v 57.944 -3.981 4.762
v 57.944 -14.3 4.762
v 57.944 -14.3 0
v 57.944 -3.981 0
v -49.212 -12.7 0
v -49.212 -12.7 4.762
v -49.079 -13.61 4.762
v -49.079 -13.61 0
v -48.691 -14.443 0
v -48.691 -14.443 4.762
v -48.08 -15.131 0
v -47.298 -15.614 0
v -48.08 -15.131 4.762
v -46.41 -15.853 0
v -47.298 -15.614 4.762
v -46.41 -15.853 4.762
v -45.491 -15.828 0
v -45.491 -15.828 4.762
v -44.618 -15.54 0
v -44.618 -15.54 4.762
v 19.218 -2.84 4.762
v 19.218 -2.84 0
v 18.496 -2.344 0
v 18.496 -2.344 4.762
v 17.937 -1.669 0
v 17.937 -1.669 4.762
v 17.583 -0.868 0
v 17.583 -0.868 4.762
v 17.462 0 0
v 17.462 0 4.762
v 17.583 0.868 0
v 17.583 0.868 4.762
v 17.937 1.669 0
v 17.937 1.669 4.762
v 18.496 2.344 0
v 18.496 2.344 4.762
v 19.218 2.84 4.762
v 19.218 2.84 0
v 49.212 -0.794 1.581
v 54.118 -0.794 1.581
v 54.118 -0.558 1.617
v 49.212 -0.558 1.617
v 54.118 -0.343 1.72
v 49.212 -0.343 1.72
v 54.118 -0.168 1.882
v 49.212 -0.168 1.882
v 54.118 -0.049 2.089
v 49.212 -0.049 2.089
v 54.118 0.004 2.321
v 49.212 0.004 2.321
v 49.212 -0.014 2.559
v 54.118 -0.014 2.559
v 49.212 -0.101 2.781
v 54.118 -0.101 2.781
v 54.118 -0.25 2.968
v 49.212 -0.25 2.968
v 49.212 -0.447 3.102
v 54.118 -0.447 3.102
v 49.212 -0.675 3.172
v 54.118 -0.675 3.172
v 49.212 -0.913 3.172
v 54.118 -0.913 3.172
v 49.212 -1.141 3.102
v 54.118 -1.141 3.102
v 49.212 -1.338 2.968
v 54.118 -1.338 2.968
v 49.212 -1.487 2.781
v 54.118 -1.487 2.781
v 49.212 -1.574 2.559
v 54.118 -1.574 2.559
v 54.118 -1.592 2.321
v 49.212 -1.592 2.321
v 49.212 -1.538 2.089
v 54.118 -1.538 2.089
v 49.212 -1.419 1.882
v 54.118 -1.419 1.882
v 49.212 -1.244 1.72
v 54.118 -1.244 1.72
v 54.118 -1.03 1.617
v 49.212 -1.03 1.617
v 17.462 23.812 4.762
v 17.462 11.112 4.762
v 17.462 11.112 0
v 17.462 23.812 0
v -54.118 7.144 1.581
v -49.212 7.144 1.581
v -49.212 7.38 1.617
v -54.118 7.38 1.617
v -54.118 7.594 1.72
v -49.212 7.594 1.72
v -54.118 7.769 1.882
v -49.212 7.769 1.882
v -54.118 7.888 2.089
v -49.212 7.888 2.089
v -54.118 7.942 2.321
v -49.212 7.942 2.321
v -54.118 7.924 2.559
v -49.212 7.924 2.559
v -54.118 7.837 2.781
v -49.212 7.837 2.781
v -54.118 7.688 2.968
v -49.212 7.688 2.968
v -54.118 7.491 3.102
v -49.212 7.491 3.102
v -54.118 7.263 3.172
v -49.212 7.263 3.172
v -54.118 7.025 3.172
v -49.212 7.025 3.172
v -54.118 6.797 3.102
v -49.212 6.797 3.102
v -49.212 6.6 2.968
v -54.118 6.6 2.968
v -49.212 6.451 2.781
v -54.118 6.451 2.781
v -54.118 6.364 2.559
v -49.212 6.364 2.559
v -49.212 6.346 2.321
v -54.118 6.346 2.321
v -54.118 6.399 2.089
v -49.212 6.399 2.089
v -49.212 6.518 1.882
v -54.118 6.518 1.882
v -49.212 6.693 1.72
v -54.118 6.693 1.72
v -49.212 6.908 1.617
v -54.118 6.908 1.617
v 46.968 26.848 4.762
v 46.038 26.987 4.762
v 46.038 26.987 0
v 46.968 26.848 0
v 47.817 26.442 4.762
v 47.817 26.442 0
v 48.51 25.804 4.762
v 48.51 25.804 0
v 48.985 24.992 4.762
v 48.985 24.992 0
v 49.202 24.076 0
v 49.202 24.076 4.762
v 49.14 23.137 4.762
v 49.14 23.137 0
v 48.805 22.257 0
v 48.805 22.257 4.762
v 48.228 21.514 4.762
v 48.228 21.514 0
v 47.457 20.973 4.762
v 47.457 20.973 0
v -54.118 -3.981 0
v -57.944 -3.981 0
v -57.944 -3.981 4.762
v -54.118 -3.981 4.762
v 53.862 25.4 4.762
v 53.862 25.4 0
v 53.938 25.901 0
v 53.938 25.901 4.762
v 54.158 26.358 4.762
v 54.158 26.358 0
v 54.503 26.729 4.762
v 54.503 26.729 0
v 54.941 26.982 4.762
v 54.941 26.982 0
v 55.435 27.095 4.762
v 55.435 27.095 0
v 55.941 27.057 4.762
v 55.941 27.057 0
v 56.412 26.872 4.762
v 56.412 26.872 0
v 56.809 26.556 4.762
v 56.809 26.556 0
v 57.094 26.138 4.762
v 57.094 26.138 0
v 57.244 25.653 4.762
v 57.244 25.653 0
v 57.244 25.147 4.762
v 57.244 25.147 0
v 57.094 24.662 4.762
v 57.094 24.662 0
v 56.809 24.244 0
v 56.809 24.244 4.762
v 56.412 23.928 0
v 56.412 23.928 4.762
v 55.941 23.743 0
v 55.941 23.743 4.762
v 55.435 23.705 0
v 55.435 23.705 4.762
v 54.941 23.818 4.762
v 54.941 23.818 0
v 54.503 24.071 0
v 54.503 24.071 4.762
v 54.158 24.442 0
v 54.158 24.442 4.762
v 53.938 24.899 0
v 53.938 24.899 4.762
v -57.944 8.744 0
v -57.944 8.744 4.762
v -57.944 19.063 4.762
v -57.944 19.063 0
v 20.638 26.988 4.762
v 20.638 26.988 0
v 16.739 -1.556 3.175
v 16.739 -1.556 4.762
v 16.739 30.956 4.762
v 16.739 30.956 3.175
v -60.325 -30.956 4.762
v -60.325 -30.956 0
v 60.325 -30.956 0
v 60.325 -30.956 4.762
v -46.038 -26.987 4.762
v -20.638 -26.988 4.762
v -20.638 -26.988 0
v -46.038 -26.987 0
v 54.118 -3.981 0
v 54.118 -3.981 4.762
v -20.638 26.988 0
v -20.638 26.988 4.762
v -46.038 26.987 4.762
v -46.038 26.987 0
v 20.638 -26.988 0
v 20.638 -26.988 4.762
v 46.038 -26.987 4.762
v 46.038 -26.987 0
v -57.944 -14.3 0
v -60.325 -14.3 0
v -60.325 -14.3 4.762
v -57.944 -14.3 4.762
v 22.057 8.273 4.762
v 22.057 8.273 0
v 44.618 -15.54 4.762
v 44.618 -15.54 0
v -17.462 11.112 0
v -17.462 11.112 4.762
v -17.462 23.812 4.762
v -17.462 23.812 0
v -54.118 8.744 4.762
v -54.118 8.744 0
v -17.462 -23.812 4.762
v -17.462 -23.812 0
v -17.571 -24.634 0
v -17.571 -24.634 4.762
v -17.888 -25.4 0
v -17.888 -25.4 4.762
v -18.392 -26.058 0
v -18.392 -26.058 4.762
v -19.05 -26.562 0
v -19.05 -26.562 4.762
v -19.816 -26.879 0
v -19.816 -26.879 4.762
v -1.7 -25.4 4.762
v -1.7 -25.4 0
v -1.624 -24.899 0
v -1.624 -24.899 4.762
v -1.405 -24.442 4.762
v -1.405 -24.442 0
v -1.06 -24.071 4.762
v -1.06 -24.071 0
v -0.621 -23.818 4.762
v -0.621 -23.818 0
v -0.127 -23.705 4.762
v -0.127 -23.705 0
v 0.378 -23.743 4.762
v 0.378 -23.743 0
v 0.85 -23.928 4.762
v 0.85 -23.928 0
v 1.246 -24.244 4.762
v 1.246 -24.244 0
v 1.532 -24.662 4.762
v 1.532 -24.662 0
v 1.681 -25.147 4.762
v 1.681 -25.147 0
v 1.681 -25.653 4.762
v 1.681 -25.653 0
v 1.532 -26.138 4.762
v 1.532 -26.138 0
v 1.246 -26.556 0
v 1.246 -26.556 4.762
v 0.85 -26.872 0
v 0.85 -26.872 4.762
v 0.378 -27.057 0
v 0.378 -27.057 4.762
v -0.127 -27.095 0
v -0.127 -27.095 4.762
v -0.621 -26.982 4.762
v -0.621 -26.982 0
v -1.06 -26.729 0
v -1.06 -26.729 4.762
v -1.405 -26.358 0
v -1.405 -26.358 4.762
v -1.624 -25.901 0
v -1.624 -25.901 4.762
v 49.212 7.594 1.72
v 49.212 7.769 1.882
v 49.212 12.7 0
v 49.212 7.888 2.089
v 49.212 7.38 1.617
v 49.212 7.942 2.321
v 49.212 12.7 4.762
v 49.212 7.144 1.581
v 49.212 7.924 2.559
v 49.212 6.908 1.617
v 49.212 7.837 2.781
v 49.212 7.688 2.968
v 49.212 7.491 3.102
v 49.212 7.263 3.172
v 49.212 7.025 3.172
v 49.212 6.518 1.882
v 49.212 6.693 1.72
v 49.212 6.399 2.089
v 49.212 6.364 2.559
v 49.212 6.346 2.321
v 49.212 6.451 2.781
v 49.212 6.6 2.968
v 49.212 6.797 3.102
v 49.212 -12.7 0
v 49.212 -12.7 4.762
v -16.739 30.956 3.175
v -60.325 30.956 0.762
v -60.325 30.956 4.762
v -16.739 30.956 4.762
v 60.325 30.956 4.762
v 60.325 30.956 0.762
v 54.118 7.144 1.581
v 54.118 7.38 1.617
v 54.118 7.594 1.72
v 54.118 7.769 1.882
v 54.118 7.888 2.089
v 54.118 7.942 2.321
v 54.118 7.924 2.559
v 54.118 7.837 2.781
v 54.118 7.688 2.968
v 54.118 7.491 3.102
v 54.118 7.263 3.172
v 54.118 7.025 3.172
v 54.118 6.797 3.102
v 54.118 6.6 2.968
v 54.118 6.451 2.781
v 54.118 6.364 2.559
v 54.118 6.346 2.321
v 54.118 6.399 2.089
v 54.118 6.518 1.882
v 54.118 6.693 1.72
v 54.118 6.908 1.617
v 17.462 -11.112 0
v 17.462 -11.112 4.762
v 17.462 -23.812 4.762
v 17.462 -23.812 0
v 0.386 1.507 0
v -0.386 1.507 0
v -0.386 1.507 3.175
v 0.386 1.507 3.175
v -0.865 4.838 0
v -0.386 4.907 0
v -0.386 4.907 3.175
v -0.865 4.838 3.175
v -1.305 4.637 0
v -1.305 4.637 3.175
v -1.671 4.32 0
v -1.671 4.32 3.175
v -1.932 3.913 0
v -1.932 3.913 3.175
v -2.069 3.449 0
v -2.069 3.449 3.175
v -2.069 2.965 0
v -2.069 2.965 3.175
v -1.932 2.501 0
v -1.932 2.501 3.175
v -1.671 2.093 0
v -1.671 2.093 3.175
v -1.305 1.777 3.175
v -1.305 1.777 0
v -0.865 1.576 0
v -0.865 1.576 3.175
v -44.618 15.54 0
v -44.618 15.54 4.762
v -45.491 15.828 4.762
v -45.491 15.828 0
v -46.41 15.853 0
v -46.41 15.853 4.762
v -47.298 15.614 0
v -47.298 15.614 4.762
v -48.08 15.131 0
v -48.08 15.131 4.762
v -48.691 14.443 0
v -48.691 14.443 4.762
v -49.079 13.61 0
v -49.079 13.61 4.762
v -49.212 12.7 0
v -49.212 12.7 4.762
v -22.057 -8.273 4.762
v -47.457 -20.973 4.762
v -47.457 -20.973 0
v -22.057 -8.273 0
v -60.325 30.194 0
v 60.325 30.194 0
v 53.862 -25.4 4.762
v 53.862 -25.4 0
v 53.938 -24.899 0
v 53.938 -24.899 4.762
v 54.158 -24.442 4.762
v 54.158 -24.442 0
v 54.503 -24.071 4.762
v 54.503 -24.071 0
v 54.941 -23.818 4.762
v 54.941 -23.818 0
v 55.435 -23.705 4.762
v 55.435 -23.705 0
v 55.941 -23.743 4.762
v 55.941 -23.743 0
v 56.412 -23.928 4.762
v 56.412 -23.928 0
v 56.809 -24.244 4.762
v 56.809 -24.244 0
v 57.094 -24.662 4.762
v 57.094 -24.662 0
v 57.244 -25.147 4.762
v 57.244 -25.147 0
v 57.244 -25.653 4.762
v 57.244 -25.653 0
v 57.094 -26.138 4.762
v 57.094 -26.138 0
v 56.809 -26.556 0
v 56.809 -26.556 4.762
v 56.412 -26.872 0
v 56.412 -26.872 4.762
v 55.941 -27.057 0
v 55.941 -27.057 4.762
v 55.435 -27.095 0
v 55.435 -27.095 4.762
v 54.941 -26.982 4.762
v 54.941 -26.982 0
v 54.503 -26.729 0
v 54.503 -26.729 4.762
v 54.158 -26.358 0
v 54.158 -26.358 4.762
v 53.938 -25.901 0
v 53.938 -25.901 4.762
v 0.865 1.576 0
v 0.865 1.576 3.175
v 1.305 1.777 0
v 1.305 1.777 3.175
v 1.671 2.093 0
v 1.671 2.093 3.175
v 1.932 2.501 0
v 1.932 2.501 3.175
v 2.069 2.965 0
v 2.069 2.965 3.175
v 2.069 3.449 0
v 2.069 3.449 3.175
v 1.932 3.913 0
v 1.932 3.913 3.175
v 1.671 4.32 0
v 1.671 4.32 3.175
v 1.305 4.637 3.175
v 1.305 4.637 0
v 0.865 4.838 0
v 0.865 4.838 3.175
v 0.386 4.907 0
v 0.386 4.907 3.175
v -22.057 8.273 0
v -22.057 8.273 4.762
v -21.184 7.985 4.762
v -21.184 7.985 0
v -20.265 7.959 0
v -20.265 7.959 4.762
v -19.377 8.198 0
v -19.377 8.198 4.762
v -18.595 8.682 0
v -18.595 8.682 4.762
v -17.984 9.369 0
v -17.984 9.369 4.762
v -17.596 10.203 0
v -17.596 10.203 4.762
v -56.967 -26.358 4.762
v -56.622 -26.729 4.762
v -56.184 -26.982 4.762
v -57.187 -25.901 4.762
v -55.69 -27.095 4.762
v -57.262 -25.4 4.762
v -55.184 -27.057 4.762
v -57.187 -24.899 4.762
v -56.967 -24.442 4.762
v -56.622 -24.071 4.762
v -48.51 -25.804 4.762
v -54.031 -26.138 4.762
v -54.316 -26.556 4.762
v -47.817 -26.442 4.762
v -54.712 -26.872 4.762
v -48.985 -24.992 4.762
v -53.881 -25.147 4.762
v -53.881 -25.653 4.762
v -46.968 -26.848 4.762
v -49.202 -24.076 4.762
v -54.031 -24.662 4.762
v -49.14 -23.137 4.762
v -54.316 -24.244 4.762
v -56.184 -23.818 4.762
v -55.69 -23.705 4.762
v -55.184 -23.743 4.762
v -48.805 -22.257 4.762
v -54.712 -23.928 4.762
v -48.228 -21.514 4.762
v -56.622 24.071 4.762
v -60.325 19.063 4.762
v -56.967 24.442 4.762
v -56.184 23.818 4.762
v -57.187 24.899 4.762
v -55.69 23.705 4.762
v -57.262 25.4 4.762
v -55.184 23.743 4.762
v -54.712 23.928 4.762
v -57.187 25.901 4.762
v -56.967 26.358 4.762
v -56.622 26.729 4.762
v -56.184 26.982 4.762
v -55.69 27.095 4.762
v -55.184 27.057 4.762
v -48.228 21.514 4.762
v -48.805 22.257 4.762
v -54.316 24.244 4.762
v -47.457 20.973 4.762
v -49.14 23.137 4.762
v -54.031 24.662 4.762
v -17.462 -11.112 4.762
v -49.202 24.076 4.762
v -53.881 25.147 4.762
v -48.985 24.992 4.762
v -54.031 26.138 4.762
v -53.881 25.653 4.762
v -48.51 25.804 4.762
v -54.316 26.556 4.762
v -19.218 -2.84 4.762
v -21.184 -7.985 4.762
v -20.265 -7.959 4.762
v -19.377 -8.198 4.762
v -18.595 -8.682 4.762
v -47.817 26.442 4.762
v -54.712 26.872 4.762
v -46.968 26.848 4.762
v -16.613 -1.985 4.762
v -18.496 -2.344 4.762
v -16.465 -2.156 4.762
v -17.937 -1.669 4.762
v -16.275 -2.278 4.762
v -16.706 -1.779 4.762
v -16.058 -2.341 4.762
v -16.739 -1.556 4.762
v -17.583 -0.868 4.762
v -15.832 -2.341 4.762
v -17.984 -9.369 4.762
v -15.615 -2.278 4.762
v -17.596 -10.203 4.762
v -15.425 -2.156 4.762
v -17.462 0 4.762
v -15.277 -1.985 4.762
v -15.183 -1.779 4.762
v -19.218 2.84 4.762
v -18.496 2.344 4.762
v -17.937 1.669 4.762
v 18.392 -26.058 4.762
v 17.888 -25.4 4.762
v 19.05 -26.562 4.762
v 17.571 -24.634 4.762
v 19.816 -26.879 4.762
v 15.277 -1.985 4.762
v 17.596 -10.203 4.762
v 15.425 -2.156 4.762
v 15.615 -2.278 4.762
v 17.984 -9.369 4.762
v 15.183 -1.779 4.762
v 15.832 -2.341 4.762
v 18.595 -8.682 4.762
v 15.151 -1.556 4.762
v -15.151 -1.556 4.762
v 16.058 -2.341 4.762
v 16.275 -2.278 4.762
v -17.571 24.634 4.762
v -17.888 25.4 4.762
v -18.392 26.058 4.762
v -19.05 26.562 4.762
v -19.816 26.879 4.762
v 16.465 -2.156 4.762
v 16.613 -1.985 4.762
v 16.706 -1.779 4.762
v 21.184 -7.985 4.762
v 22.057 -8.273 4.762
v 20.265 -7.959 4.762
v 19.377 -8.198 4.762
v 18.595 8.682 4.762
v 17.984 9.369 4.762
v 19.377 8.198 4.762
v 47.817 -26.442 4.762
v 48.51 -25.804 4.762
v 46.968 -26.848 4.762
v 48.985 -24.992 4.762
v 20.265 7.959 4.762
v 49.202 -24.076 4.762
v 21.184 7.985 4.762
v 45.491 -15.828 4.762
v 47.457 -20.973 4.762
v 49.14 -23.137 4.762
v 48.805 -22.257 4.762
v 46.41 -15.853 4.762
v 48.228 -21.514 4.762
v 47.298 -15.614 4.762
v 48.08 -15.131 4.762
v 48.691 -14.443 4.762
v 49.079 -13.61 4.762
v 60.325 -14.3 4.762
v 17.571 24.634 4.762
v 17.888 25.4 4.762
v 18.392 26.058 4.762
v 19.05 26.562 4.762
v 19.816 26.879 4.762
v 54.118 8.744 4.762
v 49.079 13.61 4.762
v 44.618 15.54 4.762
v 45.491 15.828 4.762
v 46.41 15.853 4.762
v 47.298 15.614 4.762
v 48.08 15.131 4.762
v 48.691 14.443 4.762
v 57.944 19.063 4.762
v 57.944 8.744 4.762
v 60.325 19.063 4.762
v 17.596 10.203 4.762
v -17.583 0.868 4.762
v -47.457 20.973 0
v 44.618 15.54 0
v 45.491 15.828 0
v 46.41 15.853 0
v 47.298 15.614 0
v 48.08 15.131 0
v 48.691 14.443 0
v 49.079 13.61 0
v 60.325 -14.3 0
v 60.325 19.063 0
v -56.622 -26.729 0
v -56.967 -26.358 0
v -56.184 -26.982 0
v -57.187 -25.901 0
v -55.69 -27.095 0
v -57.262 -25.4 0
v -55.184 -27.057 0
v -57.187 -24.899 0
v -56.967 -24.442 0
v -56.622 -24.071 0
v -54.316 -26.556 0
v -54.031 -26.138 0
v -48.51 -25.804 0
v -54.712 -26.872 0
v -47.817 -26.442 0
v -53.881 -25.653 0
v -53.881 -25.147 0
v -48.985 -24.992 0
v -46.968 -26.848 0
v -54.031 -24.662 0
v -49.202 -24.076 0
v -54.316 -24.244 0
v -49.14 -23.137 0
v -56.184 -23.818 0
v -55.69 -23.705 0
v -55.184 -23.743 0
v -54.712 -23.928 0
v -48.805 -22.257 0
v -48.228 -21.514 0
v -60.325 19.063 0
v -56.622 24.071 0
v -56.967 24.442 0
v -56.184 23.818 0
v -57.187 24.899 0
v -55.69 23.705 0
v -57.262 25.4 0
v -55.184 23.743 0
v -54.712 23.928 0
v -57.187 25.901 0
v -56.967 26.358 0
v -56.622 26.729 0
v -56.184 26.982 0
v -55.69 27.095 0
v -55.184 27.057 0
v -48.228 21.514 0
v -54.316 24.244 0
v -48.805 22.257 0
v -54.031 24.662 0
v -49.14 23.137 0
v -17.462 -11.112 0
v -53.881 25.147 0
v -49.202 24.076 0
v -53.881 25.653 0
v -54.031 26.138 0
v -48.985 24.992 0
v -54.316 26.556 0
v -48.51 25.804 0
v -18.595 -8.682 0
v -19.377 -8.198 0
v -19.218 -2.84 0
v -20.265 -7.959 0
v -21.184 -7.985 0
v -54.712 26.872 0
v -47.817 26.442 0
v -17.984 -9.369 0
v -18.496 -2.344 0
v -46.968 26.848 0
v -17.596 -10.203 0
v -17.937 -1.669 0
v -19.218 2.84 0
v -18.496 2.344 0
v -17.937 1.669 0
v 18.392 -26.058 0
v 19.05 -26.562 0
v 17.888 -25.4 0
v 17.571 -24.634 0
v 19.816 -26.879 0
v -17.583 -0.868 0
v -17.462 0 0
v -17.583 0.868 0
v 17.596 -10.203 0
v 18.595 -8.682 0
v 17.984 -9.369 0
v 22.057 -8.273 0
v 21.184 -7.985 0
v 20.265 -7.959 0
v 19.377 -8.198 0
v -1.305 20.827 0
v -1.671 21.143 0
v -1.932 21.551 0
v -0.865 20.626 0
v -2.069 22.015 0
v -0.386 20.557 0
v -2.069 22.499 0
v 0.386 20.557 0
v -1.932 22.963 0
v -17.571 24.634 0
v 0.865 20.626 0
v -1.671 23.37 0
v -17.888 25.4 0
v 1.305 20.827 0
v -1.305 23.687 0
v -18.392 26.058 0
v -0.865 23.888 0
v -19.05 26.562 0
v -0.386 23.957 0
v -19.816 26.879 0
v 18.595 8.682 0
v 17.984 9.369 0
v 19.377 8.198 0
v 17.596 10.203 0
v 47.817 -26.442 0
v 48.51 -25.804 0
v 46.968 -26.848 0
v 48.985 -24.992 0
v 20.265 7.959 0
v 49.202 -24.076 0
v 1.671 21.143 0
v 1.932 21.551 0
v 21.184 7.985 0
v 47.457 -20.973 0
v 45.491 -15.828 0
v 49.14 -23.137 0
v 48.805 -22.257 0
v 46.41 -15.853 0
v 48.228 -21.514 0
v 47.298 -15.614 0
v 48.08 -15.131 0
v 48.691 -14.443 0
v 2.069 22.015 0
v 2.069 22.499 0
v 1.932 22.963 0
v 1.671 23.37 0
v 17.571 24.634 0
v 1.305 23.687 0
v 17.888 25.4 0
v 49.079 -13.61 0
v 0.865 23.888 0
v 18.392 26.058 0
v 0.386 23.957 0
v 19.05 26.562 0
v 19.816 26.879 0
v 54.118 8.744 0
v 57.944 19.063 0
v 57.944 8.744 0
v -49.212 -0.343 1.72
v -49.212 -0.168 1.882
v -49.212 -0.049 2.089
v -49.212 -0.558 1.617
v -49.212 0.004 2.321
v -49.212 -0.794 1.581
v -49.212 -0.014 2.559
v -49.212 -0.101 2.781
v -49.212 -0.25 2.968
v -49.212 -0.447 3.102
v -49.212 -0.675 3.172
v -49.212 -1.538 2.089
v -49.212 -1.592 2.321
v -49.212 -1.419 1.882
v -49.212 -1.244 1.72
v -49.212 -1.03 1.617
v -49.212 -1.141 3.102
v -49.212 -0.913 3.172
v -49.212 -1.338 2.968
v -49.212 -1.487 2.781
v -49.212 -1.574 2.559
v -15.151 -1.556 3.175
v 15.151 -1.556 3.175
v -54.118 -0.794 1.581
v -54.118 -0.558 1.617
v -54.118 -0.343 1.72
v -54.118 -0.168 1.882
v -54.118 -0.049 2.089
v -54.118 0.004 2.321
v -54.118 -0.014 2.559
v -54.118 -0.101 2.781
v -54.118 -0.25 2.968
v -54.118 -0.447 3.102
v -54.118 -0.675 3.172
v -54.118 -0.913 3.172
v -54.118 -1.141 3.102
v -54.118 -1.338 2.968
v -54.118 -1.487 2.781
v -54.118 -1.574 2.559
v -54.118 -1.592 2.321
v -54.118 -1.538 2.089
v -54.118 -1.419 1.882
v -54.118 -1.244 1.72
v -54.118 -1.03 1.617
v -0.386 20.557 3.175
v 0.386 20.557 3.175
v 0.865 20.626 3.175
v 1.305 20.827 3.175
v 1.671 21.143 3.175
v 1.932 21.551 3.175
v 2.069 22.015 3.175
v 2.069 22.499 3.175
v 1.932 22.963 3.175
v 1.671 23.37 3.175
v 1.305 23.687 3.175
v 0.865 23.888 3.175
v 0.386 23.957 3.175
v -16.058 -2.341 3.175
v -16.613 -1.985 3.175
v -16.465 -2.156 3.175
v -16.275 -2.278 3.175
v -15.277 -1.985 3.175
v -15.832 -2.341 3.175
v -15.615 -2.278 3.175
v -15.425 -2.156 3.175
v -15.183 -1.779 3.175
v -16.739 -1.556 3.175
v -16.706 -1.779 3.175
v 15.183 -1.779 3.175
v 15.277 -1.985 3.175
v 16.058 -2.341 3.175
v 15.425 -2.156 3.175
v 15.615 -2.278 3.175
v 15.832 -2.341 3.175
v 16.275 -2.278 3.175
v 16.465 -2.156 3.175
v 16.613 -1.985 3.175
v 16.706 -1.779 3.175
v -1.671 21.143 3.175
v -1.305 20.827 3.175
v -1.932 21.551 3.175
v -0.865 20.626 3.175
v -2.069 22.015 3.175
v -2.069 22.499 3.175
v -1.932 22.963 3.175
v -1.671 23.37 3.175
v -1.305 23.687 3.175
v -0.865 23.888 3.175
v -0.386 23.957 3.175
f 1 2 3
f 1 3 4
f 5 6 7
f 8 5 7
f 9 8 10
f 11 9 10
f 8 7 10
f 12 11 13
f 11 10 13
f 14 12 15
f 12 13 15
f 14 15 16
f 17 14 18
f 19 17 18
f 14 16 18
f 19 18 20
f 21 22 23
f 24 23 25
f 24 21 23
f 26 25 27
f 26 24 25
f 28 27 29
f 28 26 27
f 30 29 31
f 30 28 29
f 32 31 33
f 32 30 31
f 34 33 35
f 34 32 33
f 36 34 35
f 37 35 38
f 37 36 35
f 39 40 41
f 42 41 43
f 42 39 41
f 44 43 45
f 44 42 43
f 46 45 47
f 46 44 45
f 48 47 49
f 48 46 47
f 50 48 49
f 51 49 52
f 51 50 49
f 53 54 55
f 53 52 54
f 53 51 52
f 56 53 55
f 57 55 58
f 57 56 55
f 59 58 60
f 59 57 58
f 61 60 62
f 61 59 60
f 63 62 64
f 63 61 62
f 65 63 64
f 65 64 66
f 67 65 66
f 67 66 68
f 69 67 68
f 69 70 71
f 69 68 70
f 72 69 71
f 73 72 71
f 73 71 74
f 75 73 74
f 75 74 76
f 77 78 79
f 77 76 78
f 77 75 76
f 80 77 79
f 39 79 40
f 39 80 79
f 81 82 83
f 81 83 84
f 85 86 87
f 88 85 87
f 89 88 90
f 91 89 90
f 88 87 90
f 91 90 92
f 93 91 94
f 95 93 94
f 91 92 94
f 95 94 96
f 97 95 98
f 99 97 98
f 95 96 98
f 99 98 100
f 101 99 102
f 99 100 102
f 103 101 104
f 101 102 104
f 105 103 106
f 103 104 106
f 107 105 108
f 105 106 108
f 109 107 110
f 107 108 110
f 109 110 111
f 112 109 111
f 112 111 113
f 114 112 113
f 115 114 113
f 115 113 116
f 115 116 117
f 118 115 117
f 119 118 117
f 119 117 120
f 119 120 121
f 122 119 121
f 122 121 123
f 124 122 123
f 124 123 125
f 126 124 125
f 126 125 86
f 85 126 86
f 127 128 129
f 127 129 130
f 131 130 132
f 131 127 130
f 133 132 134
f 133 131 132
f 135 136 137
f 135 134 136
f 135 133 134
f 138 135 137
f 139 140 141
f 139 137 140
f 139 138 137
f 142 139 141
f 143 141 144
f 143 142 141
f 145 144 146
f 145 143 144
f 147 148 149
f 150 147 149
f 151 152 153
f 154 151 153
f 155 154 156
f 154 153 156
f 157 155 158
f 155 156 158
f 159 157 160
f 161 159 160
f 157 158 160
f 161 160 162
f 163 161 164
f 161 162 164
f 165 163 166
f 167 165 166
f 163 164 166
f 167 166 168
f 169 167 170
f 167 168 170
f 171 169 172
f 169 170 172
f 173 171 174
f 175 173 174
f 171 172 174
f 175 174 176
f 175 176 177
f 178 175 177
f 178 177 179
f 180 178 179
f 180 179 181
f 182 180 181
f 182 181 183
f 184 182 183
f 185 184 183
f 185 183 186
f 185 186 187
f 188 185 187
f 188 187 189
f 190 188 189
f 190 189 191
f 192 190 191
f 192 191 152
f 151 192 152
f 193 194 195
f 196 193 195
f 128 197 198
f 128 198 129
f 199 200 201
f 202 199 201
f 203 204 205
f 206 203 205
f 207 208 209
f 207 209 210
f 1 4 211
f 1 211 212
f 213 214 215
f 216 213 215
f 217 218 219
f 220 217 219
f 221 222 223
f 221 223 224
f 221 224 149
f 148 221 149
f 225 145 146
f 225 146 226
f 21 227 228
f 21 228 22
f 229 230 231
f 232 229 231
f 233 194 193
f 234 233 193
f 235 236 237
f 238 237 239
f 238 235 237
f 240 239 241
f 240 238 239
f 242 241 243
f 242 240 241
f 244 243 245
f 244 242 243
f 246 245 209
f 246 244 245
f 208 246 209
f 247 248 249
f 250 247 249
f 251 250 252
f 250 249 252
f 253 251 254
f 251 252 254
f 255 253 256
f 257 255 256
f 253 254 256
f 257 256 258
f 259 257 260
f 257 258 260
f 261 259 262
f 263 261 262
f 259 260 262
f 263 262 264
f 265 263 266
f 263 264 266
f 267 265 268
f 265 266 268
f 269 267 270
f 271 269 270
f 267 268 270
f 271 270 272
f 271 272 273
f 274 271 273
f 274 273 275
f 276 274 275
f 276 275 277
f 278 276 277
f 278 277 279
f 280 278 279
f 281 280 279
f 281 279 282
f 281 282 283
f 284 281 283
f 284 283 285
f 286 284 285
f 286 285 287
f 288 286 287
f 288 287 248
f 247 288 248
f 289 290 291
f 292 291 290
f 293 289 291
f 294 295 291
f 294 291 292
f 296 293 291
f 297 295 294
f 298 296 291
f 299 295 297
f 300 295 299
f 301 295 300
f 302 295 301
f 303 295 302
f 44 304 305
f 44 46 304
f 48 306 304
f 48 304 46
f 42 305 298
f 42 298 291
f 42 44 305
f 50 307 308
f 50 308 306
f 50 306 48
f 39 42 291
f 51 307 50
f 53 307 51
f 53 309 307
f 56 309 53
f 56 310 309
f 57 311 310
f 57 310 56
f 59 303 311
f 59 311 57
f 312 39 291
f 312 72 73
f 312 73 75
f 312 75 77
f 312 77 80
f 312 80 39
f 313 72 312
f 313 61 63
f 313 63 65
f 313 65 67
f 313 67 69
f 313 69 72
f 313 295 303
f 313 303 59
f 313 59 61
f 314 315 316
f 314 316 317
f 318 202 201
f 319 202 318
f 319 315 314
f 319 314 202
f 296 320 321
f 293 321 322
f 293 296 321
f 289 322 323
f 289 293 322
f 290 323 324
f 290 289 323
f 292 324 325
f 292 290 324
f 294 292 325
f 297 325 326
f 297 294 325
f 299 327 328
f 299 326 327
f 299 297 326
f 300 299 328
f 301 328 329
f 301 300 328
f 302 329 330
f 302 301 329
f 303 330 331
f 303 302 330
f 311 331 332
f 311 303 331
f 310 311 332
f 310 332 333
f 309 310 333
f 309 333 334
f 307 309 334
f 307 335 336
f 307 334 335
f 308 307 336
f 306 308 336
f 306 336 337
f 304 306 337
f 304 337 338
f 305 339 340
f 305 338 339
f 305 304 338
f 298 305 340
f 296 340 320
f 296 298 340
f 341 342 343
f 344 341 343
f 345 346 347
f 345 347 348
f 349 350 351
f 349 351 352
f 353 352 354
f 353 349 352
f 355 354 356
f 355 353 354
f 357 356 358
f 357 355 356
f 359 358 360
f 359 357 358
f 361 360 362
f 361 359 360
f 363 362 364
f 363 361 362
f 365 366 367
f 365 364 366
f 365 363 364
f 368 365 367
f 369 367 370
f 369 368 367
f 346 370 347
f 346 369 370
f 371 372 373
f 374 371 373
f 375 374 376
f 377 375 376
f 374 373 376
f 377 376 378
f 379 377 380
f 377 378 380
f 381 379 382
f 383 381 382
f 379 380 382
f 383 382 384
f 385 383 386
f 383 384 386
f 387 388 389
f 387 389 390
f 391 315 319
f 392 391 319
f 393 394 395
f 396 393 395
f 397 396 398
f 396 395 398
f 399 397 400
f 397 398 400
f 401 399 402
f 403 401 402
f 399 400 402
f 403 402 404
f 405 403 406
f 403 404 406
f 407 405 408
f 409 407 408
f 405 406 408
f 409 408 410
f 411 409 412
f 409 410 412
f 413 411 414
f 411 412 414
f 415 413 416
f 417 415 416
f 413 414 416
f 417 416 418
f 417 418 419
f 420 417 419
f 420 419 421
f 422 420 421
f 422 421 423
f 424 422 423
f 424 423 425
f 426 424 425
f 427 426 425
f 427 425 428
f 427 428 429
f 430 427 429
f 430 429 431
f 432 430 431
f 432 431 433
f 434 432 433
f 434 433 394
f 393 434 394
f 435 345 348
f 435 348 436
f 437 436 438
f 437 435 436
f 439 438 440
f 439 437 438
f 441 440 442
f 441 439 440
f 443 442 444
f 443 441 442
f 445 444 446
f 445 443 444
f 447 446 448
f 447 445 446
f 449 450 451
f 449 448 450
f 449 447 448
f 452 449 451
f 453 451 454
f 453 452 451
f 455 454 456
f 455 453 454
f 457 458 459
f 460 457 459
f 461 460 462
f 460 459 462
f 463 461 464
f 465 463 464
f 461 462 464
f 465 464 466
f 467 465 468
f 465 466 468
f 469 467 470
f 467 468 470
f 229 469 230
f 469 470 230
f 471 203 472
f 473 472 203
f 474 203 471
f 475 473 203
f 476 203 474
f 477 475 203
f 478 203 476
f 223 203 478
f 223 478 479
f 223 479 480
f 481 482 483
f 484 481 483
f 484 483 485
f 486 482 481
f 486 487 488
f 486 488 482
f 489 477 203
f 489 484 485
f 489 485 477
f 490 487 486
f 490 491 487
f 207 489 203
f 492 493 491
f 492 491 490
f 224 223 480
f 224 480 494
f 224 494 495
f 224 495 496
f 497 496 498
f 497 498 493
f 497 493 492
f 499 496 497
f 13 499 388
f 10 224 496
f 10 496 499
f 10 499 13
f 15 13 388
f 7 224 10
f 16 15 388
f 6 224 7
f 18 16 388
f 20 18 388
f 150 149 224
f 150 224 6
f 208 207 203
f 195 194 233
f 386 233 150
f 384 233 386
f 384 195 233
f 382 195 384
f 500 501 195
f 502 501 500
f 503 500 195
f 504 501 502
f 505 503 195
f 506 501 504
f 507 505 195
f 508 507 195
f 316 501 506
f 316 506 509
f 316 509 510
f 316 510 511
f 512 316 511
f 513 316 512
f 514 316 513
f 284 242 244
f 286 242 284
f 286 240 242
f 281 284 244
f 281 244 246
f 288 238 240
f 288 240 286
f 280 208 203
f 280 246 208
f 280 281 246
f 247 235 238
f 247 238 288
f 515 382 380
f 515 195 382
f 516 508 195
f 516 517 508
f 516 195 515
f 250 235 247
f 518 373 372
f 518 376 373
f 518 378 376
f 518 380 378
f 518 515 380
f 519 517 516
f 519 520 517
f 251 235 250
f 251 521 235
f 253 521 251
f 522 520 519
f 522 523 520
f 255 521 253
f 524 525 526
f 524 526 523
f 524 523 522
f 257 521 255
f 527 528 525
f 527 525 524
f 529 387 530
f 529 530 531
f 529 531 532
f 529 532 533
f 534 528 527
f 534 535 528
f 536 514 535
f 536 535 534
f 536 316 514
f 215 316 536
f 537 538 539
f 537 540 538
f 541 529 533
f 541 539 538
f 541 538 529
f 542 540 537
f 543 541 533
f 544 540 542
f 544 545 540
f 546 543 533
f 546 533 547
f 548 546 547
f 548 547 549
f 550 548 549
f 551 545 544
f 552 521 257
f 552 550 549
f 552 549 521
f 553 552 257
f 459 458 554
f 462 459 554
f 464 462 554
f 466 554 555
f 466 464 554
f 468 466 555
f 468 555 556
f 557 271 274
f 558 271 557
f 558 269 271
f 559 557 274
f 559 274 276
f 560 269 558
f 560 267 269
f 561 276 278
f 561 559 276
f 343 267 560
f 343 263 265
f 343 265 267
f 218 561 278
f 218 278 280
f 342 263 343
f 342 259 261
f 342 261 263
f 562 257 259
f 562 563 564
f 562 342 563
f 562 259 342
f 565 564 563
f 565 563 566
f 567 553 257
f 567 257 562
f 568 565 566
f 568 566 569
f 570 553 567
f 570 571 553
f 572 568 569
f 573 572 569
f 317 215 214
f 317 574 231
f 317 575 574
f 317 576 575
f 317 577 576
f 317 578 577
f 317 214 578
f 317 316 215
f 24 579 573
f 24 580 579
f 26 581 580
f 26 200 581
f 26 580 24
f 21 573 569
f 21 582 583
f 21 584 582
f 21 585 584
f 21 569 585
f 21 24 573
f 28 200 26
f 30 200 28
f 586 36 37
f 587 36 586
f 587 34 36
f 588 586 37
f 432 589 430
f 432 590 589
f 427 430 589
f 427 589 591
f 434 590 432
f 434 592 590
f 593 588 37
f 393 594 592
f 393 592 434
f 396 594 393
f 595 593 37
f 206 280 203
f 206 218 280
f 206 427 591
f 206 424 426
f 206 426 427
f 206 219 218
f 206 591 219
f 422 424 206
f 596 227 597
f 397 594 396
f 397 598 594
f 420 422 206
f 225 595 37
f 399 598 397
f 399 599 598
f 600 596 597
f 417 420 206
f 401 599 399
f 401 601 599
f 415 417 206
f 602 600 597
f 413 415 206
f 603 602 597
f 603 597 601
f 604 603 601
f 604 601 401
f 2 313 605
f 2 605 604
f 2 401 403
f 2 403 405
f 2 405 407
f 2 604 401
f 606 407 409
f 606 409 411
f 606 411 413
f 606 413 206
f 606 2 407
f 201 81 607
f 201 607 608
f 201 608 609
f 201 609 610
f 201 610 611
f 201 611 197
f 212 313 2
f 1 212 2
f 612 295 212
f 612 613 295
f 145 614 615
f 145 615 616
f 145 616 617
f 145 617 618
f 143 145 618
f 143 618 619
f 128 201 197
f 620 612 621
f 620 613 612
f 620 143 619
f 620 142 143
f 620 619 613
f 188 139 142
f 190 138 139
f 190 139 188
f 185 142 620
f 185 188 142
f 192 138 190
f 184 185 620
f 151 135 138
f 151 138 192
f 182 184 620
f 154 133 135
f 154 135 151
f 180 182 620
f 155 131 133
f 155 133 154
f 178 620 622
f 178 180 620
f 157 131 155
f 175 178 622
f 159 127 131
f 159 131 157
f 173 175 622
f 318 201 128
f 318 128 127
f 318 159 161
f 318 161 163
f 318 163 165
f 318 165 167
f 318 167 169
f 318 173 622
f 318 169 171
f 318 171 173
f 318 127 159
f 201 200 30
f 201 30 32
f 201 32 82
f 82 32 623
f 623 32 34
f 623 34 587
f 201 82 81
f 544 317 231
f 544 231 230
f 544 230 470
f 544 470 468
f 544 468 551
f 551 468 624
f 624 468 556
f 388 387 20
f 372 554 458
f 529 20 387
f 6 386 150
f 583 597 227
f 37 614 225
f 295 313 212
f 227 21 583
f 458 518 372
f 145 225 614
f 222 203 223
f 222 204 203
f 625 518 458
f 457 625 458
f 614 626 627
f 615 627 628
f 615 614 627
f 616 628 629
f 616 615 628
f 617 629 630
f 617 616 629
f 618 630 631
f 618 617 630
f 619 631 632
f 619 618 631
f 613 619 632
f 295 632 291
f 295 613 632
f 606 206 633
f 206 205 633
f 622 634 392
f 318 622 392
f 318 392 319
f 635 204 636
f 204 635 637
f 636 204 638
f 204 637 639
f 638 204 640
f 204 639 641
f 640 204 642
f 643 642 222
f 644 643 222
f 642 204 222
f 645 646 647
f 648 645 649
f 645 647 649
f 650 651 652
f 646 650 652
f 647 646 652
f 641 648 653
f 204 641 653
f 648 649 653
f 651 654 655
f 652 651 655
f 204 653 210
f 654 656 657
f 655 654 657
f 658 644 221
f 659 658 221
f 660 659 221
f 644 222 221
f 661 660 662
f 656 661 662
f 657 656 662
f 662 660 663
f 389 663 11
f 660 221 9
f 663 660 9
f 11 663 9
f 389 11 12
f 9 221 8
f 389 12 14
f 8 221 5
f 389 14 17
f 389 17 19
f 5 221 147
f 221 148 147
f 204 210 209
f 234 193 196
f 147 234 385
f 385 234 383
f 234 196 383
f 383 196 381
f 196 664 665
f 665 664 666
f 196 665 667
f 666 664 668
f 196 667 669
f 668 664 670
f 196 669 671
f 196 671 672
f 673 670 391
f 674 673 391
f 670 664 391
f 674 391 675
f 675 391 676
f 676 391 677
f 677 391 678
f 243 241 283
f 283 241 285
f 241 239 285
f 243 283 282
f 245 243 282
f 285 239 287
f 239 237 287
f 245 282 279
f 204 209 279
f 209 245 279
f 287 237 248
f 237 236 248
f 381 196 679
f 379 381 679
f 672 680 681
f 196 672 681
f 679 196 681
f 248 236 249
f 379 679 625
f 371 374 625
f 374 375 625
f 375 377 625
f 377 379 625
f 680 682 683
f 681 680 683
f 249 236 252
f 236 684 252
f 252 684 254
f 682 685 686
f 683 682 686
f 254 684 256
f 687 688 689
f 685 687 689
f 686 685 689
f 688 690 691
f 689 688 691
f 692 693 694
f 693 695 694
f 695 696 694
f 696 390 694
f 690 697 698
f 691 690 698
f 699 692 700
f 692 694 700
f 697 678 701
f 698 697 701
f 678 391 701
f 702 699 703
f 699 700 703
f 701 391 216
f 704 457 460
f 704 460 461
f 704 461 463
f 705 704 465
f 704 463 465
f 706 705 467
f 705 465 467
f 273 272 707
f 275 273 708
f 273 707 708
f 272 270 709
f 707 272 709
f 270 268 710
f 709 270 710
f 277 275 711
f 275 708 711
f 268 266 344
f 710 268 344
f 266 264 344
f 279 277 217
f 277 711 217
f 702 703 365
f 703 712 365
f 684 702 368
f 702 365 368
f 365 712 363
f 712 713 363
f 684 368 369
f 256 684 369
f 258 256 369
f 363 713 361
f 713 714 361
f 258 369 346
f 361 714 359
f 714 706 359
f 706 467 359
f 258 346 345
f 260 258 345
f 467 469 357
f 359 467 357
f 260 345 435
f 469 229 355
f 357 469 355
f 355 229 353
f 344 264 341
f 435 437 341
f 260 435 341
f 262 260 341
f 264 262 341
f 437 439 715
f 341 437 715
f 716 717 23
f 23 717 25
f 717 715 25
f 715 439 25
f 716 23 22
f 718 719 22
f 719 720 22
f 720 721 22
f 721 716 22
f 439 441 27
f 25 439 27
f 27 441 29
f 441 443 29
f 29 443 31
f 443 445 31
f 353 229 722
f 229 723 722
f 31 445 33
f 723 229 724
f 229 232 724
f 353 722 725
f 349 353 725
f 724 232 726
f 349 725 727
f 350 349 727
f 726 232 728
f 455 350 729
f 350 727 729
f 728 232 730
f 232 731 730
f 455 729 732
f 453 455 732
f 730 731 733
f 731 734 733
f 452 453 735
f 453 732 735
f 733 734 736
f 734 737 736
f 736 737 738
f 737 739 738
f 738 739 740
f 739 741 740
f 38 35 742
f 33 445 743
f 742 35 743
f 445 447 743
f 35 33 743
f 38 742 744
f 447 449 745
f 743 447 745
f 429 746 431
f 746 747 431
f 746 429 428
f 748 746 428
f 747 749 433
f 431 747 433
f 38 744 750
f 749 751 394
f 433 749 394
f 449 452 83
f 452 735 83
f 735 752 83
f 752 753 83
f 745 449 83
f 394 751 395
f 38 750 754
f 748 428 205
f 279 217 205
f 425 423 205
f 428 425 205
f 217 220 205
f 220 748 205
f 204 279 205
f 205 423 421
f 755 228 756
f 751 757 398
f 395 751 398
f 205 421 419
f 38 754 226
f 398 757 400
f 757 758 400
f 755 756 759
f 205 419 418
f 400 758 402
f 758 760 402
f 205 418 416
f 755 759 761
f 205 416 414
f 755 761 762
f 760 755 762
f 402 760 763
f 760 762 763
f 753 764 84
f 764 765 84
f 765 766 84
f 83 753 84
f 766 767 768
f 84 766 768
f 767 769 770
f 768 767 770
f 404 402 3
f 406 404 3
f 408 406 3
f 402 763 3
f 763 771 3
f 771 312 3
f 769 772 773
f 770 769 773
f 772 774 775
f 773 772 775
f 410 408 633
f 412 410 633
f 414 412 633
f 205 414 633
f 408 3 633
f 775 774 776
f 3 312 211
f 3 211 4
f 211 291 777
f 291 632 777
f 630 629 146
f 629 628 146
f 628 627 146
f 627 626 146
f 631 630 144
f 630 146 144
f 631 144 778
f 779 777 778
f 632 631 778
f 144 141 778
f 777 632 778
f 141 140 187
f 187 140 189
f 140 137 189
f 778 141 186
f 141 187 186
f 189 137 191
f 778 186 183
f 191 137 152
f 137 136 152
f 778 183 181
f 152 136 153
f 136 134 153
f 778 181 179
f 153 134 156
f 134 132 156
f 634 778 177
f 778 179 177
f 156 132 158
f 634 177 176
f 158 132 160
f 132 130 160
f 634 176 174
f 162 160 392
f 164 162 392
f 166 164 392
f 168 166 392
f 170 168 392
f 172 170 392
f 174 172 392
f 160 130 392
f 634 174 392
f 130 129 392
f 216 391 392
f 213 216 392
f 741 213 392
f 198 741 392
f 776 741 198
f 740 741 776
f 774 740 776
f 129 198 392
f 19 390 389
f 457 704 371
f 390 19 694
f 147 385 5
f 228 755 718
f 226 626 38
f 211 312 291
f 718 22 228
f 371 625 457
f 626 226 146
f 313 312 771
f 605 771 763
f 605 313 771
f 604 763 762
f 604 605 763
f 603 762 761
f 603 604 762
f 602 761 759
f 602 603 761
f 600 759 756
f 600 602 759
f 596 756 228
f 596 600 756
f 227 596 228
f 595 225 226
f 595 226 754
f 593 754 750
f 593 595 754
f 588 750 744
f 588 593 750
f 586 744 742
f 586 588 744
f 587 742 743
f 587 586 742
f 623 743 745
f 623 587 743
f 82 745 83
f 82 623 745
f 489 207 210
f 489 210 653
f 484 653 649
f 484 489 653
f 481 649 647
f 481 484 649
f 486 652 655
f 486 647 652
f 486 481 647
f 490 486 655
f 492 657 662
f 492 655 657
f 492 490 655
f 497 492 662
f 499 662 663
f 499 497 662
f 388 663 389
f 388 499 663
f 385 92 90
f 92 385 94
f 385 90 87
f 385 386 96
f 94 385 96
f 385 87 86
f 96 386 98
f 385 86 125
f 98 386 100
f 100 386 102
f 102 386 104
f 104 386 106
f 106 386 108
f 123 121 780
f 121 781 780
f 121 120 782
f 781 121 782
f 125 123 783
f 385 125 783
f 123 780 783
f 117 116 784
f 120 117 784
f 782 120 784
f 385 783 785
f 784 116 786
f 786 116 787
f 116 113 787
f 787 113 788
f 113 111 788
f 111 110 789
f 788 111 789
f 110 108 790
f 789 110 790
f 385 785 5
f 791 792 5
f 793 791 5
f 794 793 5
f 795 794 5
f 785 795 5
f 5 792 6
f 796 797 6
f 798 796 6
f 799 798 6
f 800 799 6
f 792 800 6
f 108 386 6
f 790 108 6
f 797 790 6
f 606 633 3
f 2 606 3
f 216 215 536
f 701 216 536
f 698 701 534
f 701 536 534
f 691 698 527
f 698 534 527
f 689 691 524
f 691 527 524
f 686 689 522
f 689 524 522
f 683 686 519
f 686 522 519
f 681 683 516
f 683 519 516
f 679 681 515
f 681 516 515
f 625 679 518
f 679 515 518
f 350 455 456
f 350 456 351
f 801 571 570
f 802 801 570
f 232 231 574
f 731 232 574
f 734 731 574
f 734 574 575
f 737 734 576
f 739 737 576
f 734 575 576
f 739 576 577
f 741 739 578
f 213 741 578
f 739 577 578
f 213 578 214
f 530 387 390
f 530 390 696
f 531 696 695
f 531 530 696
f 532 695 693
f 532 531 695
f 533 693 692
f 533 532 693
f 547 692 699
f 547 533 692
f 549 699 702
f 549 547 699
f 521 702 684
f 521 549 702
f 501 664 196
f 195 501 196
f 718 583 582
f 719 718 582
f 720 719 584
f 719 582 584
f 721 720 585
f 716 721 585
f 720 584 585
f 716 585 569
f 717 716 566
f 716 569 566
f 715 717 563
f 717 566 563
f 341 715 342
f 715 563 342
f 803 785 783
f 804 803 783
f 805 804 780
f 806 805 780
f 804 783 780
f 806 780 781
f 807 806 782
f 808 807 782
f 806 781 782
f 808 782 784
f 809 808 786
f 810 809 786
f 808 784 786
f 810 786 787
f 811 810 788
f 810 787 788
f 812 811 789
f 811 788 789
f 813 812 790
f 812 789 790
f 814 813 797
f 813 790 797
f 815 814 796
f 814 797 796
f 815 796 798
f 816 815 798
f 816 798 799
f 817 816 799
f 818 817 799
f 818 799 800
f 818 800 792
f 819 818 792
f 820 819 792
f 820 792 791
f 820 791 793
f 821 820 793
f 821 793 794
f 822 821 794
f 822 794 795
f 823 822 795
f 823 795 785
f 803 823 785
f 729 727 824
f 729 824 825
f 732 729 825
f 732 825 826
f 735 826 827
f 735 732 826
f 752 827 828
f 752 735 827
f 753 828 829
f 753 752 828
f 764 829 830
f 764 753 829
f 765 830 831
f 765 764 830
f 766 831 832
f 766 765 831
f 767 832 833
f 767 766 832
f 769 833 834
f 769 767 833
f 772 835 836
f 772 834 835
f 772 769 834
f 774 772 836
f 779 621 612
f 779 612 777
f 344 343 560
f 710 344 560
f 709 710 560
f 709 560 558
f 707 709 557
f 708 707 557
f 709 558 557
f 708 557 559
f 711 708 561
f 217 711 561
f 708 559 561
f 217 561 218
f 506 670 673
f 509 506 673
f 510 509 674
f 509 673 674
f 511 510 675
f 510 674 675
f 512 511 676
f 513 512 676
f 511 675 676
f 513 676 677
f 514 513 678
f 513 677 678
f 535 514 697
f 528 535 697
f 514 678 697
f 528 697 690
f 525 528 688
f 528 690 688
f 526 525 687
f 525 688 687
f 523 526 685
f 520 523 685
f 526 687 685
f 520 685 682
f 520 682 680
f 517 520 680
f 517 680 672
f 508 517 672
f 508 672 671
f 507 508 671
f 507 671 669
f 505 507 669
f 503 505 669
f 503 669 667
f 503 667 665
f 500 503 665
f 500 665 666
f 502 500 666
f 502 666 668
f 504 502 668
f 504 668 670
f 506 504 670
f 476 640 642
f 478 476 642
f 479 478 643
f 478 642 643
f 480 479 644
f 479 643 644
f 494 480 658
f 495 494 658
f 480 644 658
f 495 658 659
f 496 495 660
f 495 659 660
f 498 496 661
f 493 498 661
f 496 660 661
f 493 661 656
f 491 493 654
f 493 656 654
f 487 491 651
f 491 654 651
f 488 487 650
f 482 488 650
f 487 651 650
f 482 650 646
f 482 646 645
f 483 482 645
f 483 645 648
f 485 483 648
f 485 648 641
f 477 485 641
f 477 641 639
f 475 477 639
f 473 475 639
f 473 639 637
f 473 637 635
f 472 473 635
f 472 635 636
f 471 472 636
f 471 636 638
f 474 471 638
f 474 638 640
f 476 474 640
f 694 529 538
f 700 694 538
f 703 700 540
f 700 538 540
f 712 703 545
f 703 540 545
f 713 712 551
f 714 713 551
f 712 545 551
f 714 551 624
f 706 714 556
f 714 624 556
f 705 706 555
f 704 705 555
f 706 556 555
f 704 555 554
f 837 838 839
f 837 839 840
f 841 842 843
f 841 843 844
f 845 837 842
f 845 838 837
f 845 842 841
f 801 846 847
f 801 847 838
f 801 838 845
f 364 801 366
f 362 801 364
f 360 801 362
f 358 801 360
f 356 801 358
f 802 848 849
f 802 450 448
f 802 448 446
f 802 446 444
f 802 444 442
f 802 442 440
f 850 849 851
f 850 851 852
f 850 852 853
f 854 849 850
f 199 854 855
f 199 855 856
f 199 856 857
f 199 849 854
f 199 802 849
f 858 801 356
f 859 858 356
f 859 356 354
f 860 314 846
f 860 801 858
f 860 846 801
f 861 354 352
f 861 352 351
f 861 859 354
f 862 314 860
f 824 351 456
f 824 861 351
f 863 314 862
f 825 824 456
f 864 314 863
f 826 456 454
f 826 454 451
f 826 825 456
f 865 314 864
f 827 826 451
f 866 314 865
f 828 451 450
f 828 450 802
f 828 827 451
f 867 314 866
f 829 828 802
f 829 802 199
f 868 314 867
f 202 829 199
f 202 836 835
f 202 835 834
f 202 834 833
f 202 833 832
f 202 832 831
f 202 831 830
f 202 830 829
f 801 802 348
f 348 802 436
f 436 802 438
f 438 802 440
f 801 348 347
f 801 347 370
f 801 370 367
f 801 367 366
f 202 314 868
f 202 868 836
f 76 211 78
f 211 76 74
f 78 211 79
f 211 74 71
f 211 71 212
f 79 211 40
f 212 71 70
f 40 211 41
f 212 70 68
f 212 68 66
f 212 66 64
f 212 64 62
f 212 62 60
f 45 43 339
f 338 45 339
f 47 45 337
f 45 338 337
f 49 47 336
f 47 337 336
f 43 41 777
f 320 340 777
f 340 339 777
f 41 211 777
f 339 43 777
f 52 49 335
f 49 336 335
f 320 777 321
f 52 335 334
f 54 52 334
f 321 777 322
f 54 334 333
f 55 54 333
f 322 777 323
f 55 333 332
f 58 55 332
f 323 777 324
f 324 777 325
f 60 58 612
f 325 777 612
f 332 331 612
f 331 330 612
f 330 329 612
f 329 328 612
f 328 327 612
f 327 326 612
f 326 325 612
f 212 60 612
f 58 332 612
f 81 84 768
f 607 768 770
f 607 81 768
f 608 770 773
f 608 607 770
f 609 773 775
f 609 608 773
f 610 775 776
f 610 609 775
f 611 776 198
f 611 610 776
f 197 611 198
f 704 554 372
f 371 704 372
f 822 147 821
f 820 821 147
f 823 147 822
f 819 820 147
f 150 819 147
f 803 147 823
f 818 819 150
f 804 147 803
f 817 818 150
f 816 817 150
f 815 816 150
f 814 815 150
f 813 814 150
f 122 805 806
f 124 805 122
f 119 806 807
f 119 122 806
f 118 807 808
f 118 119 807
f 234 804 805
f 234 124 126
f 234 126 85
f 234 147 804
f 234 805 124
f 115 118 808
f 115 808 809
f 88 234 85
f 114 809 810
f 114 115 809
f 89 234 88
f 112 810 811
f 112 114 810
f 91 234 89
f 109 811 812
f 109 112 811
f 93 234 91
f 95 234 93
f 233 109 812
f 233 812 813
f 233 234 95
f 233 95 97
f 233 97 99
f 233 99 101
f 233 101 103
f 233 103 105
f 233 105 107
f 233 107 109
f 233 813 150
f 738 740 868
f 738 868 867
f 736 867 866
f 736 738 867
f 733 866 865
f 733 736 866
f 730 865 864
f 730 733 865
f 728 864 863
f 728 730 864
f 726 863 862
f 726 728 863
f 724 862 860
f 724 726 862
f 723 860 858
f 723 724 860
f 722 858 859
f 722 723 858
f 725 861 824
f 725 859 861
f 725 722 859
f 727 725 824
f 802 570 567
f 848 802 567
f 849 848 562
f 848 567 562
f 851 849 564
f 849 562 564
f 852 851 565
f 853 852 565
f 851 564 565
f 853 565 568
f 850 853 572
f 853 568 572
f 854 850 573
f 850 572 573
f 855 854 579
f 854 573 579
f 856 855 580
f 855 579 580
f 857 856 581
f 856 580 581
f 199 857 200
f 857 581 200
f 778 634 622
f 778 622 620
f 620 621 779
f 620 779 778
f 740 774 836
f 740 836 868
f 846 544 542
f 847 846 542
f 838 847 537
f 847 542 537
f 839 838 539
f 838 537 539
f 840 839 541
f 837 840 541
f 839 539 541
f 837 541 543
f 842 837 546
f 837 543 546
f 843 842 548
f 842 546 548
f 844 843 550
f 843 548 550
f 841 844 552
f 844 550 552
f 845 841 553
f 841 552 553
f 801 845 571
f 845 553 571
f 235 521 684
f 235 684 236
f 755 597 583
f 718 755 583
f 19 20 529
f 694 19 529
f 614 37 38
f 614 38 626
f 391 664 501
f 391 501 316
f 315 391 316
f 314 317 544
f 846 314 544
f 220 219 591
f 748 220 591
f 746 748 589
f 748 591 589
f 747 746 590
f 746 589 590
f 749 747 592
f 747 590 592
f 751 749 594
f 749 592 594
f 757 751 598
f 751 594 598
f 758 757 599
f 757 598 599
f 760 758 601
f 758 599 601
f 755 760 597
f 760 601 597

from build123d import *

# Parameters (mm, degrees)
SKETCH1_W                 = 120.65
SKETCH1_H                 = 61.9125
BOSS_EXTRUDE1_DEPTH       = 4.7625
SKETCH2_W                 = 4.7625
SKETCH2_H                 = 12.7254
BOSS_EXTRUDE2_DEPTH       = 22.225
CUT_EXTRUDE1_REACH        = 129.448
SKETCH3_R                 = 2.25
FILLET1_R                 = 6.35
FILLET1_OF_MIRROR2_R      = 6.35
M3_CLEARANCE_SLOT1_DEPTH  = 4.7625
SKETCH7_W                 = 2.38125
SKETCH7_H                 = 10.31875
CUT_EXTRUDE3_DEPTH        = 72.353666087
CUT_EXTRUDE4_DEPTH        = 6.207125
CUT_EXTRUDE5_DEPTH        = 72.353666087
CUT_EXTRUDE6_DEPTH        = 72.353666087
M2X0_4_TAPPED_HOLE1_D     = 1.6
M2X0_4_TAPPED_HOLE1_DEPTH = 4.905375
CUT_EXTRUDE7_DEPTH        = 1.5875
M3_CLEARANCE_HOLE2_D      = 3.4
CHAMFER1_SIZE             = 0.762


# Read off the part's stored shape, not the designer's step: M3 Clearance Slot1
with BuildPart() as part:
    # Sketch1 → Boss-Extrude1 (new body)
    with BuildSketch(Plane.XY):
        Rectangle(SKETCH1_W, SKETCH1_H)
    extrude(amount=BOSS_EXTRUDE1_DEPTH)

    # Sketch2 → Boss-Extrude2 (add)
    with BuildSketch(Plane.XY.offset(4.7625)):
        with Locations((-57.94375, 2.38125)):
            Rectangle(SKETCH2_W, SKETCH2_H)
    boss_extrude2 = extrude(amount=BOSS_EXTRUDE2_DEPTH)

    # Sketch3 → Cut-Extrude1 (cut, up to next)
    with BuildSketch(Plane.ZY.offset(60.325), mode=Mode.PRIVATE) as cut_extrude1_sk1:
        with Locations((19.05, 2.36855)):
            Circle(SKETCH3_R)
    cut_extrude1_tool1 = extrude(cut_extrude1_sk1.sketch, amount=-CUT_EXTRUDE1_REACH, mode=Mode.PRIVATE) & part.part
    cut_extrude1 = cut_extrude1_tool1.solids().sort_by_distance((-60.325, 2.36855, 19.05))[0]
    add(cut_extrude1, mode=Mode.SUBTRACT)

    # Fillet1
    fillet1_edges = [part.edges().sort_by_distance(p)[0] for p in [
        (-57.94375, -3.98145, 26.9875),
        (-57.94375, 8.74395, 26.9875),
    ]]
    fillet(fillet1_edges, radius=FILLET1_R)

    # Mirror2: Boss-Extrude2, Cut-Extrude1 across plane
    add(boss_extrude2.mirror(Plane(origin=(0, 0, 0), x_dir=(0, 0, 1), z_dir=(1, 0, 0))))
    add(cut_extrude1.mirror(Plane(origin=(0, 0, 0), x_dir=(0, 0, 1), z_dir=(1, 0, 0))), mode=Mode.SUBTRACT)

    # Fillet1 of Mirror2
    fillet1_of_mirror2_edges = [part.edges().sort_by_distance(p)[0] for p in [
        (57.94375, -3.98145, 26.9875),
        (57.94375, 8.74395, 26.9875),
    ]]
    fillet(fillet1_of_mirror2_edges, radius=FILLET1_OF_MIRROR2_R)

    # M3 Clearance Slot1 outline → M3 Clearance Slot1 (cut)
    with BuildSketch(Plane.XY):
        with BuildLine():
            ThreePointArc((0.386099968, 1.50675), (2.086099968, 3.20675), (0.386099968, 4.90675))
            Line((0.386099968, 4.90675), (-0.386099968, 4.90675))
            ThreePointArc((-0.386099968, 4.90675), (-2.086099968, 3.20675), (-0.386099968, 1.50675))
            Line((-0.386099968, 1.50675), (0.386099968, 1.50675))
        make_face()
        with BuildLine():
            ThreePointArc((0.386099968, 20.55675), (2.086099968, 22.25675), (0.386099968, 23.95675))
            Line((0.386099968, 23.95675), (-0.386099968, 23.95675))
            ThreePointArc((-0.386099968, 23.95675), (-2.086099968, 22.25675), (-0.386099968, 20.55675))
            Line((-0.386099968, 20.55675), (0.386099968, 20.55675))
        make_face()
    extrude(amount=M3_CLEARANCE_SLOT1_DEPTH, mode=Mode.SUBTRACT)

    # Sketch7 → Cut-Extrude3 (cut, through all)
    with BuildSketch(Plane.XY.offset(4.7625)):
        with Locations((-59.134375, 13.903325)):
            Rectangle(SKETCH7_W, SKETCH7_H)
        with Locations((-59.134375, -9.140825)):
            Rectangle(SKETCH7_W, SKETCH7_H)
    cut_extrude3 = extrude(amount=-CUT_EXTRUDE3_DEPTH, mode=Mode.SUBTRACT)

    # Sketch8 → Cut-Extrude4 (cut)
    with BuildSketch(Plane.ZY.offset(60.325)):
        with BuildLine():
            Line((0, 8.74395), (0, -3.98145))
            Line((0, -3.98145), (20.6375, -3.98145))
            ThreePointArc((20.6375, -3.98145), (25.127628061, -2.121578061), (26.9875, 2.36855))
            Line((26.9875, 2.36855), (26.9875, 2.39395))
            ThreePointArc((26.9875, 2.39395), (25.127628061, 6.884078061), (20.6375, 8.74395))
            Line((20.6375, 8.74395), (0, 8.74395))
        make_face()
    cut_extrude4 = extrude(amount=-CUT_EXTRUDE4_DEPTH, mode=Mode.SUBTRACT)

    # Sketch11 → Cut-Extrude5 (cut, through all)
    with BuildSketch(Plane.XY.offset(4.7625)):
        with BuildLine():
            Line((-19.217596834, 2.839806331), (-44.617596834, 15.539806331))
            ThreePointArc((-44.617596834, 15.539806331), (-47.706696281, 15.400816317), (-49.2125, 12.7))
            Line((-49.2125, 12.7), (-49.2125, -12.7))
            ThreePointArc((-49.2125, -12.7), (-47.706696281, -15.400816317), (-44.617596834, -15.539806331))
            Line((-44.617596834, -15.539806331), (-19.217596834, -2.839806331))
            ThreePointArc((-19.217596834, -2.839806331), (-17.4625, 0), (-19.217596834, 2.839806331))
        make_face()
    cut_extrude5 = extrude(amount=-CUT_EXTRUDE5_DEPTH, mode=Mode.SUBTRACT)

    # Sketch12 → Cut-Extrude6 (cut, through all)
    with BuildSketch(Plane.XY.offset(4.7625)):
        with BuildLine():
            Line((-47.457403166, 20.972693669), (-22.057403166, 8.272693669))
            ThreePointArc((-22.057403166, 8.272693669), (-18.968303719, 8.411683683), (-17.4625, 11.1125))
            Line((-17.4625, 11.1125), (-17.4625, 23.8125))
            ThreePointArc((-17.4625, 23.8125), (-18.39243597, 26.05756403), (-20.6375, 26.9875))
            Line((-20.6375, 26.9875), (-46.0375, 26.9875))
            ThreePointArc((-46.0375, 26.9875), (-49.127565542, 24.541965523), (-47.457403166, 20.972693669))
        make_face()
        with BuildLine():
            Line((-20.6375, -26.9875), (-46.0375, -26.9875))
            ThreePointArc((-46.0375, -26.9875), (-49.127565542, -24.541965523), (-47.457403166, -20.972693669))
            Line((-47.457403166, -20.972693669), (-22.057403166, -8.272693669))
            ThreePointArc((-22.057403166, -8.272693669), (-18.968303719, -8.411683683), (-17.4625, -11.1125))
            Line((-17.4625, -11.1125), (-17.4625, -23.8125))
            ThreePointArc((-17.4625, -23.8125), (-18.39243597, -26.05756403), (-20.6375, -26.9875))
        make_face()
    cut_extrude6 = extrude(amount=-CUT_EXTRUDE6_DEPTH, mode=Mode.SUBTRACT)

    # M2x0.4 Tapped Hole1
    with Locations(Plane.ZY.offset(54.117875)):
        with Locations((2.38125, 7.14375), (2.38125, -0.79375)):
            m2x0_4_tapped_hole1 = Hole(M2X0_4_TAPPED_HOLE1_D / 2, depth=M2X0_4_TAPPED_HOLE1_DEPTH)

    # Mirror4: Cut-Extrude5, Cut-Extrude6 across plane
    add(cut_extrude5.mirror(Plane(origin=(0, 0, 0), x_dir=(0, 0, 1), z_dir=(1, 0, 0))), mode=Mode.SUBTRACT)
    add(cut_extrude6.mirror(Plane(origin=(0, 0, 0), x_dir=(0, 0, 1), z_dir=(1, 0, 0))), mode=Mode.SUBTRACT)

    # Mirror3: Cut-Extrude3, Cut-Extrude4, M2x0.4 Tapped Hole1 across plane
    add(cut_extrude3.mirror(Plane(origin=(0, 0, 0), x_dir=(0, 0, 1), z_dir=(1, 0, 0))), mode=Mode.SUBTRACT)
    add(cut_extrude4.mirror(Plane(origin=(0, 0, 0), x_dir=(0, 0, 1), z_dir=(1, 0, 0))), mode=Mode.SUBTRACT)
    add(m2x0_4_tapped_hole1.mirror(Plane(origin=(0, 0, 0), x_dir=(0, 0, 1), z_dir=(1, 0, 0))), mode=Mode.SUBTRACT)

    # Sketch13 → Cut-Extrude7 (cut)
    with BuildSketch(Plane.XY.offset(4.7625)):
        with BuildLine():
            Line((-16.7386, 30.95625), (-16.7386, -1.55575))
            ThreePointArc((-16.7386, -1.55575), (-15.94485, -2.3495), (-15.1511, -1.55575))
            Line((-15.1511, -1.55575), (15.1511, -1.55575))
            ThreePointArc((15.1511, -1.55575), (15.94485, -2.3495), (16.7386, -1.55575))
            Line((16.7386, -1.55575), (16.7386, 30.95625))
            Line((16.7386, 30.95625), (-16.7386, 30.95625))
        make_face()
    extrude(amount=-CUT_EXTRUDE7_DEPTH, mode=Mode.SUBTRACT)

    # M3 Clearance Hole2 (through all)
    with Locations(Plane.XY.offset(4.7625)):
        with Locations((-55.5625, 25.4), (-55.5625, -25.4), (0, -25.4), (55.5625, 25.4), (55.5625, -25.4)):
            Hole(M3_CLEARANCE_HOLE2_D / 2)

    # Chamfer1
    chamfer1_edges = [part.edges().sort_by_distance(p)[0] for p in [
        (0, 30.95625, 0),
    ]]
    chamfer(chamfer1_edges, length=CHAMFER1_SIZE)


solid = part.part
